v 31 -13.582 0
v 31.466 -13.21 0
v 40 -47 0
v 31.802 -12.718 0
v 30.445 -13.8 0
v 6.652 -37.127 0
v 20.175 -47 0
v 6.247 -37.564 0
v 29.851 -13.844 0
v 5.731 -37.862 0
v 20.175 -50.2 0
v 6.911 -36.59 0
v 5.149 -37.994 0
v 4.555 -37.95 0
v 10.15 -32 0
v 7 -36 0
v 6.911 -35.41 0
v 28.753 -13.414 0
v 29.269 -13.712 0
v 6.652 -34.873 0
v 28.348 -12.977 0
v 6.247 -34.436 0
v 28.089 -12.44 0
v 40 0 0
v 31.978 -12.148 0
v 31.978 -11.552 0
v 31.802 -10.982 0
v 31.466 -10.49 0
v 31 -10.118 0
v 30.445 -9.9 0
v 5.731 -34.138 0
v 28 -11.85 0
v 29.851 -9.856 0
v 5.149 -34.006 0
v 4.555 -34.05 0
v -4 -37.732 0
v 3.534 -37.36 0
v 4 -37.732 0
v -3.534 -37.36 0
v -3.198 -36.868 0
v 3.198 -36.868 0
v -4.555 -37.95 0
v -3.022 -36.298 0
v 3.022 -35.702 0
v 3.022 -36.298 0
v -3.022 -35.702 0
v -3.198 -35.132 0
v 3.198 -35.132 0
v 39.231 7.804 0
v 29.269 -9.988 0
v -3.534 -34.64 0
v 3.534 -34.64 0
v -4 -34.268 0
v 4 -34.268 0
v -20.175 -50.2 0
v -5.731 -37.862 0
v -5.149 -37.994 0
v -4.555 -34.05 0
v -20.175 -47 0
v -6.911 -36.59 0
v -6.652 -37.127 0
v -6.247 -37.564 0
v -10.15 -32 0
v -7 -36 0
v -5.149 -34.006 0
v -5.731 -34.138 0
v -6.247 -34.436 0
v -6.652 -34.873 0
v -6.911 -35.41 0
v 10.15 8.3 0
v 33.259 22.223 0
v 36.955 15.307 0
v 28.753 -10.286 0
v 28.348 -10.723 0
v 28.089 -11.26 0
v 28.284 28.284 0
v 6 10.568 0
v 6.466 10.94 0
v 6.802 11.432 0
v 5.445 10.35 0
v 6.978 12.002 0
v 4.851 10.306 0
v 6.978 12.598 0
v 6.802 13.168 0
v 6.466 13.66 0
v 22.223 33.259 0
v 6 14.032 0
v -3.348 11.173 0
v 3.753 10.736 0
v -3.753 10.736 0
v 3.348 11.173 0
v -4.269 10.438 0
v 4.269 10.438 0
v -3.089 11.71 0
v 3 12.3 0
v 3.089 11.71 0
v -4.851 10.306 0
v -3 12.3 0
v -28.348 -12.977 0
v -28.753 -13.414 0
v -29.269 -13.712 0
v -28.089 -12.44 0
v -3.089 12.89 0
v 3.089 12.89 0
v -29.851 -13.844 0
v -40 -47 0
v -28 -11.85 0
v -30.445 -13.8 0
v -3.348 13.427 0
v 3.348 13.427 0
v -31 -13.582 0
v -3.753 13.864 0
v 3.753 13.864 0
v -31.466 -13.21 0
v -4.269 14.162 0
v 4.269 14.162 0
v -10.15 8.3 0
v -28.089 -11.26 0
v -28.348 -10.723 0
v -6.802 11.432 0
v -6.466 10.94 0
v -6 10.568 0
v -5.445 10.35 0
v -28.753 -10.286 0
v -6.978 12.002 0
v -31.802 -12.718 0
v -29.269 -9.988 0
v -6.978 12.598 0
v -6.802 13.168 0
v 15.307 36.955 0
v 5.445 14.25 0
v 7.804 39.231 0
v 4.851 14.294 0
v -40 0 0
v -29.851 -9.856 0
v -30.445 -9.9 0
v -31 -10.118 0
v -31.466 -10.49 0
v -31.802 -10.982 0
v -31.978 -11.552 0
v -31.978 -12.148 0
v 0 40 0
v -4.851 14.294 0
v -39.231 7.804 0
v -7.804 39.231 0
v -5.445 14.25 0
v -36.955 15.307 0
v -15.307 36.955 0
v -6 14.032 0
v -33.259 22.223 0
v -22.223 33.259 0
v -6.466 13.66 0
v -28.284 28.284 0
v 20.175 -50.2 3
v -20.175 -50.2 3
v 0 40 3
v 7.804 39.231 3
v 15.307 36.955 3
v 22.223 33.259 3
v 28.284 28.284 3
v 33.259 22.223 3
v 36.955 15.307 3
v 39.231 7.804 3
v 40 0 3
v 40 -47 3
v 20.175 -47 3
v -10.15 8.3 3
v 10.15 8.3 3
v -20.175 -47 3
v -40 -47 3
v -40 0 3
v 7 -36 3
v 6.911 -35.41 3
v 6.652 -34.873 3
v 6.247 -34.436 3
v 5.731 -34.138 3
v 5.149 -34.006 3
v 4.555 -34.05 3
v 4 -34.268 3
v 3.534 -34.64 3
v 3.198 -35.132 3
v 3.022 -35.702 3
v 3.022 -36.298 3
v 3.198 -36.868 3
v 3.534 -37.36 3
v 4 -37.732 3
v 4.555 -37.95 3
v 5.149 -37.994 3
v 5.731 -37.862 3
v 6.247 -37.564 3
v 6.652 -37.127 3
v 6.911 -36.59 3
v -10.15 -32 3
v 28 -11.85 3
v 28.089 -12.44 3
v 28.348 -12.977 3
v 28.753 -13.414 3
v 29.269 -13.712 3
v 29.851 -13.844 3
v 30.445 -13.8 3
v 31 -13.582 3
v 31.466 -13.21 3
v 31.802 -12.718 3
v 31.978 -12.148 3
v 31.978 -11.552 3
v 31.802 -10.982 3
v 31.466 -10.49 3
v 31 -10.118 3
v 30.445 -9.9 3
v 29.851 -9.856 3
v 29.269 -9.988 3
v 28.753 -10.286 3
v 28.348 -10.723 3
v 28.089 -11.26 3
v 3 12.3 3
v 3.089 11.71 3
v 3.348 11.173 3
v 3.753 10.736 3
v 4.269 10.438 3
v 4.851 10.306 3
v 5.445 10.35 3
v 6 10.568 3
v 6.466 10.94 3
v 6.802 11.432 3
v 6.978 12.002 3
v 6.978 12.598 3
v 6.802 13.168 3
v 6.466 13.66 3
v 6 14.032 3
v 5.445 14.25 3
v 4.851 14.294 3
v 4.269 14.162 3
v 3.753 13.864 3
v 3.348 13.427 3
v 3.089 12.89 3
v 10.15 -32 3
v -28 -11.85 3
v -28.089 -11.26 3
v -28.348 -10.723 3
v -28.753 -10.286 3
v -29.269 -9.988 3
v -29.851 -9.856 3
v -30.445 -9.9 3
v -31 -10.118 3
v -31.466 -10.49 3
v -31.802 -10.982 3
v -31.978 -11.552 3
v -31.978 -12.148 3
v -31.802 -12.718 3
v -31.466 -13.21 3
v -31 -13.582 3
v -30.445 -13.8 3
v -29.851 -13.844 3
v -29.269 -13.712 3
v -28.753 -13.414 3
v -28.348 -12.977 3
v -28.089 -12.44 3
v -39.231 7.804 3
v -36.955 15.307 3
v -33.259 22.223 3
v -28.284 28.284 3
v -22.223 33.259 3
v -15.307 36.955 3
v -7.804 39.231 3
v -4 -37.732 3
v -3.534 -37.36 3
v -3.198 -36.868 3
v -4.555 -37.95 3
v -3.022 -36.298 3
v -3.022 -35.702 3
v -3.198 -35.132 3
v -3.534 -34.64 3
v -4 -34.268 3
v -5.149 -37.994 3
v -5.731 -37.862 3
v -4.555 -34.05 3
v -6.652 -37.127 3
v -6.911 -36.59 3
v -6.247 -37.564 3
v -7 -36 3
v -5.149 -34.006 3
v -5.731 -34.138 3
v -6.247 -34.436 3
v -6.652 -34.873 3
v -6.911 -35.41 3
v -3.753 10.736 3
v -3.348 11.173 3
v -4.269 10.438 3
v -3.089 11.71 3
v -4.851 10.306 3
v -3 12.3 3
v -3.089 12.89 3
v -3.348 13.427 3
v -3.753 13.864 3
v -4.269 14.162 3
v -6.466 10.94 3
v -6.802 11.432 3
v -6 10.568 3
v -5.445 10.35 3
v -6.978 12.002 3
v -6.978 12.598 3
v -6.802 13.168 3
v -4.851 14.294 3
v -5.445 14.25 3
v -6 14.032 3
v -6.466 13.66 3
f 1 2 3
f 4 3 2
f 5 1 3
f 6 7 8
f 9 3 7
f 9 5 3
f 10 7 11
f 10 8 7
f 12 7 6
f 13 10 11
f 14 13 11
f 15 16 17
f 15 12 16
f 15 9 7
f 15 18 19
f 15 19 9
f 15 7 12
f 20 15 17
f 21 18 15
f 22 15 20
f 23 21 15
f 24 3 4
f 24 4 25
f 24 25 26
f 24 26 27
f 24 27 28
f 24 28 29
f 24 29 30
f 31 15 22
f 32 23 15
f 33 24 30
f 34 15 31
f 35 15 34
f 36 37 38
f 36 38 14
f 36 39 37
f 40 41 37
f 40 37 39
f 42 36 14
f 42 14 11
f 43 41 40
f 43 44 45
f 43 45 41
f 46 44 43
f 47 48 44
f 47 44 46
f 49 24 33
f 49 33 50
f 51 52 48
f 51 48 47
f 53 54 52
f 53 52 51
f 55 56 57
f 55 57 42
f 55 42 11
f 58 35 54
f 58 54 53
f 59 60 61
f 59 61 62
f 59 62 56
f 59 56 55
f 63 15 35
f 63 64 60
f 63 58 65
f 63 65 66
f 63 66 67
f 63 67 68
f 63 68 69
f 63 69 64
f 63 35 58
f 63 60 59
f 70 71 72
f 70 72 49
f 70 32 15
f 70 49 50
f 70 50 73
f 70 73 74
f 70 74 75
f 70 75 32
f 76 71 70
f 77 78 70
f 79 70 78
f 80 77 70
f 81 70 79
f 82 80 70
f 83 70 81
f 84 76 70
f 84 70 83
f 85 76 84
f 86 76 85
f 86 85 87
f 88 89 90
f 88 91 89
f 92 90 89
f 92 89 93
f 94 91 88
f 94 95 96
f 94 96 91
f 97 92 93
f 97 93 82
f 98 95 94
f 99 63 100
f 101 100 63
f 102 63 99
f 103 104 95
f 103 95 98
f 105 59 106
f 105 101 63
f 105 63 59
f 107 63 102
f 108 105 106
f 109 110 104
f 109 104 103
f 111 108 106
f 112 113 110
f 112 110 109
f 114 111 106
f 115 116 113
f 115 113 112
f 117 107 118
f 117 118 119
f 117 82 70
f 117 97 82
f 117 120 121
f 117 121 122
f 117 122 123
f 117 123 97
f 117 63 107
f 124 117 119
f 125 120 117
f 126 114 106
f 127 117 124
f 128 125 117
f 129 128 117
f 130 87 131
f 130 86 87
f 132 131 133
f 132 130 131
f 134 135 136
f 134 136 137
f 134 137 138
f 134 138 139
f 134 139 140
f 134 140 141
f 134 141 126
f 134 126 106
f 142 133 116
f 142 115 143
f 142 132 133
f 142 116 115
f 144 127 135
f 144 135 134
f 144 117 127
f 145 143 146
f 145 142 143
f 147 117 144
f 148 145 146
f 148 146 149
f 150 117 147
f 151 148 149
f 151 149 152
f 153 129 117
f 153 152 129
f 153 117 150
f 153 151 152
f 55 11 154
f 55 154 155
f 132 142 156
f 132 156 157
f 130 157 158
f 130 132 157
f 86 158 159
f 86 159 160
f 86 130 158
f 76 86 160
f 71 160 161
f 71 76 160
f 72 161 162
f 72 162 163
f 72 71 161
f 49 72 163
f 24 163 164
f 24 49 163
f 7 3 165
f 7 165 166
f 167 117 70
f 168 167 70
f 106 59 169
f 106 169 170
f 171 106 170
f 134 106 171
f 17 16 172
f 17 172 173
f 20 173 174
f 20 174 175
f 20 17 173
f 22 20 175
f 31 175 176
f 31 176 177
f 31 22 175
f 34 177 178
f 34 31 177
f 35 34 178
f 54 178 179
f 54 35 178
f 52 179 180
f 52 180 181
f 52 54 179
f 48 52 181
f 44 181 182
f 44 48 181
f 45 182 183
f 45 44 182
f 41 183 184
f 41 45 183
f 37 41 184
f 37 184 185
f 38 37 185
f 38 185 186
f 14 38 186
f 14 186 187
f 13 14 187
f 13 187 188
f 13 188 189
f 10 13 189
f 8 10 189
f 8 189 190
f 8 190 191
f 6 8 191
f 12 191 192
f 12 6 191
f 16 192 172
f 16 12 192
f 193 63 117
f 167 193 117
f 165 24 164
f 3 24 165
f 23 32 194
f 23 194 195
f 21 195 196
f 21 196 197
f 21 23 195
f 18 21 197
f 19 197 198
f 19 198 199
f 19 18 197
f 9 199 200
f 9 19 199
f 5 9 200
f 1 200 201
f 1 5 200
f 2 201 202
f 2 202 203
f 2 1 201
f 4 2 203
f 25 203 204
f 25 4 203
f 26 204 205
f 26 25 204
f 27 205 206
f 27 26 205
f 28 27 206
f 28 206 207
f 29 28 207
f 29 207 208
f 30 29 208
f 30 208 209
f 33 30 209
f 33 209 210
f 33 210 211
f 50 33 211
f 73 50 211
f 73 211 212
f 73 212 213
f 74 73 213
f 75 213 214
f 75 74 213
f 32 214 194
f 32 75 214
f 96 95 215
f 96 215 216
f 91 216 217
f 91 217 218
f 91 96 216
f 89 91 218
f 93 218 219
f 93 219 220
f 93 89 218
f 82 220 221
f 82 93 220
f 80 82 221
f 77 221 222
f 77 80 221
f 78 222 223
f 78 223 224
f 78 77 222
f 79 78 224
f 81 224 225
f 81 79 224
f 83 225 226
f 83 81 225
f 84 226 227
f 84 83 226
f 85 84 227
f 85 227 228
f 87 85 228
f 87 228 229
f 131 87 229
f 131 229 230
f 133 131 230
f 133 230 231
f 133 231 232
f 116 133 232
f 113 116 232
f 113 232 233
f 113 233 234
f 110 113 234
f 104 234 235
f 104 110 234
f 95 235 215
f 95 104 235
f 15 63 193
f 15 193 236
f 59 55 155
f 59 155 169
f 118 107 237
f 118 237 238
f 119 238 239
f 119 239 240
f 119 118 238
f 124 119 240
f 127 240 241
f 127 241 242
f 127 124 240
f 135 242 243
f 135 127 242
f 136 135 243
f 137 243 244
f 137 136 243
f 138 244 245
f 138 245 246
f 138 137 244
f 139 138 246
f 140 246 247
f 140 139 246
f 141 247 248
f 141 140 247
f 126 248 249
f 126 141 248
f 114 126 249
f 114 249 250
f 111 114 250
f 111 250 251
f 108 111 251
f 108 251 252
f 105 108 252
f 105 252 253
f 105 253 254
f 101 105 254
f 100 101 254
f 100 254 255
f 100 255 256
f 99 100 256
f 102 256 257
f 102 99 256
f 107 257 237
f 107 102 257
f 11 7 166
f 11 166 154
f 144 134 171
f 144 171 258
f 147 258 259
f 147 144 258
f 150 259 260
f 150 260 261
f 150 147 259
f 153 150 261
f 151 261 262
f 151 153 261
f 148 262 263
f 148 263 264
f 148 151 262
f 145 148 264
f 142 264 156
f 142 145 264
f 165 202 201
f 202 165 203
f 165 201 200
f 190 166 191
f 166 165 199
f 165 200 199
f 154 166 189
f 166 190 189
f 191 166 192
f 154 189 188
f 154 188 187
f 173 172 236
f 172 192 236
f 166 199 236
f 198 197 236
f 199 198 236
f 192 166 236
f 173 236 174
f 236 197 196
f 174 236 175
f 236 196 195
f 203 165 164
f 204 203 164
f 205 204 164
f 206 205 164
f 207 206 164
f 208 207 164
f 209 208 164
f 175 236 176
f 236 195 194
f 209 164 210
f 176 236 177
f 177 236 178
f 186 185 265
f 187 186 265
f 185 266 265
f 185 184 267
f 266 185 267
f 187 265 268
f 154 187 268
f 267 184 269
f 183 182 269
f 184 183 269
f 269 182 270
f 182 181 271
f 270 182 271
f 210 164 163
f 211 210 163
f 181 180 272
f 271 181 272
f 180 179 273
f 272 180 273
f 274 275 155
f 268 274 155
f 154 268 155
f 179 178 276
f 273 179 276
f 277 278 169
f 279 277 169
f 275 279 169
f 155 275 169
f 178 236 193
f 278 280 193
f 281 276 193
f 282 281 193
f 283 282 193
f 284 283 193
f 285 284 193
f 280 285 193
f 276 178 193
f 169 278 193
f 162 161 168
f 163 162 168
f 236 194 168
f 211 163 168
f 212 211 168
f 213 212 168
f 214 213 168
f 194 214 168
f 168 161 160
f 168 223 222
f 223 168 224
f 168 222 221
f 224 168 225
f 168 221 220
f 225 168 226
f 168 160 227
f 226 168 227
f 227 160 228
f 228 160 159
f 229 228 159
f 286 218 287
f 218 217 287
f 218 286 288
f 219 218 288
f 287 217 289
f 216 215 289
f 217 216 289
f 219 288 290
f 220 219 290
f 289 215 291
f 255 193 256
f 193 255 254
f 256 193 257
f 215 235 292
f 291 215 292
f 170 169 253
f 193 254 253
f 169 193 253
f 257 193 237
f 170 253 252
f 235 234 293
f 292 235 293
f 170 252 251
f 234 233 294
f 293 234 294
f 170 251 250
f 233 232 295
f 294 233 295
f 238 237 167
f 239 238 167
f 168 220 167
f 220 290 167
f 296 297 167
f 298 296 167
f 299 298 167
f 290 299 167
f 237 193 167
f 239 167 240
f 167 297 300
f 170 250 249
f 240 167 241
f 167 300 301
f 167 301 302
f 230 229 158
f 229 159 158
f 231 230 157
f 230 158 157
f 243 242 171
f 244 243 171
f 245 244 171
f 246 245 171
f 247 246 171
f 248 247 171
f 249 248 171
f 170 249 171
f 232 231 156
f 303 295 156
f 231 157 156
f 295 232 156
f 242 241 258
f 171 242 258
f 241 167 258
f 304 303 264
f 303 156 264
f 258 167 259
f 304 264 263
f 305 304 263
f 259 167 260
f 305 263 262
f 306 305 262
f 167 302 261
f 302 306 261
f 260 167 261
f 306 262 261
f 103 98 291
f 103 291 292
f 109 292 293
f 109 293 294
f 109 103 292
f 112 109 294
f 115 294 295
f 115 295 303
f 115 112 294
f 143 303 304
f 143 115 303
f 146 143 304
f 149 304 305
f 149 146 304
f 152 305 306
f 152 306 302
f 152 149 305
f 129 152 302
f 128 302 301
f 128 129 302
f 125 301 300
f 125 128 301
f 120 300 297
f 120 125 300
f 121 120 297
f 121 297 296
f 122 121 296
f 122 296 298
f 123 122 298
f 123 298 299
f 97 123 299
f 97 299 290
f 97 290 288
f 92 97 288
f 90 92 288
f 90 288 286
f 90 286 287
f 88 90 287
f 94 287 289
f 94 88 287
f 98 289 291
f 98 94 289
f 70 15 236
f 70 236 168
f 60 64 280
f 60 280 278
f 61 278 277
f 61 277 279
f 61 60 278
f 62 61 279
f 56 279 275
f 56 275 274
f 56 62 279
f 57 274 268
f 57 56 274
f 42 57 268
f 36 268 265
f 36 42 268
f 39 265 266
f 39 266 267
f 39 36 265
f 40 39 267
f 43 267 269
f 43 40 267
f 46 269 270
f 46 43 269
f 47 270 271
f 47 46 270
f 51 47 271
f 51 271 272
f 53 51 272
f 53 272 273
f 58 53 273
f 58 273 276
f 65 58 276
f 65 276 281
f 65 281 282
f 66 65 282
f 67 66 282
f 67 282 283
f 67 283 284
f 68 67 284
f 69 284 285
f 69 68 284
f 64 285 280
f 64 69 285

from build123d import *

# Parameters (mm, degrees)
CROQUIS1_R              = 2
CROQUIS1_W              = 20.3
CROQUIS1_H              = 40.3
SALIENTE_EXTRUIR1_DEPTH = 3


with BuildPart() as part:
    # Croquis1 → Saliente-Extruir1 (new body)
    with BuildSketch(Plane.XY):
        with BuildLine():
            Line((40, 0), (40, -47))
            Line((40, -47), (20.175, -47))
            Line((20.175, -47), (20.175, -50.2))
            Line((20.175, -50.2), (-20.175, -50.2))
            Line((-20.175, -50.2), (-20.175, -47))
            Line((-20.175, -47), (-40, -47))
            Line((-40, -47), (-40, 0))
            ThreePointArc((-40, 0), (-28.284271247, 28.284271247), (0, 40))
            ThreePointArc((0, 40), (28.284271247, 28.284271247), (40, 0))
        make_face()
        with Locations((-5, 12.3)):
            Circle(CROQUIS1_R, mode=Mode.SUBTRACT)
        with Locations(Location((5, 12.3, 0), (0, 0, 180))):
            Circle(CROQUIS1_R, mode=Mode.SUBTRACT)
        with Locations((5, -36)):
            Circle(CROQUIS1_R, mode=Mode.SUBTRACT)
        with Locations(Location((-5, -36, 0), (0, 0, 180))):
            Circle(CROQUIS1_R, mode=Mode.SUBTRACT)
        with Locations((-30, -11.85)):
            Circle(CROQUIS1_R, mode=Mode.SUBTRACT)
        with Locations(Location((30, -11.85, 0), (0, 0, 180))):
            Circle(CROQUIS1_R, mode=Mode.SUBTRACT)
        with Locations((0, -11.85)):
            Rectangle(CROQUIS1_W, CROQUIS1_H, mode=Mode.SUBTRACT)
    extrude(amount=SALIENTE_EXTRUIR1_DEPTH)


solid = part.part
